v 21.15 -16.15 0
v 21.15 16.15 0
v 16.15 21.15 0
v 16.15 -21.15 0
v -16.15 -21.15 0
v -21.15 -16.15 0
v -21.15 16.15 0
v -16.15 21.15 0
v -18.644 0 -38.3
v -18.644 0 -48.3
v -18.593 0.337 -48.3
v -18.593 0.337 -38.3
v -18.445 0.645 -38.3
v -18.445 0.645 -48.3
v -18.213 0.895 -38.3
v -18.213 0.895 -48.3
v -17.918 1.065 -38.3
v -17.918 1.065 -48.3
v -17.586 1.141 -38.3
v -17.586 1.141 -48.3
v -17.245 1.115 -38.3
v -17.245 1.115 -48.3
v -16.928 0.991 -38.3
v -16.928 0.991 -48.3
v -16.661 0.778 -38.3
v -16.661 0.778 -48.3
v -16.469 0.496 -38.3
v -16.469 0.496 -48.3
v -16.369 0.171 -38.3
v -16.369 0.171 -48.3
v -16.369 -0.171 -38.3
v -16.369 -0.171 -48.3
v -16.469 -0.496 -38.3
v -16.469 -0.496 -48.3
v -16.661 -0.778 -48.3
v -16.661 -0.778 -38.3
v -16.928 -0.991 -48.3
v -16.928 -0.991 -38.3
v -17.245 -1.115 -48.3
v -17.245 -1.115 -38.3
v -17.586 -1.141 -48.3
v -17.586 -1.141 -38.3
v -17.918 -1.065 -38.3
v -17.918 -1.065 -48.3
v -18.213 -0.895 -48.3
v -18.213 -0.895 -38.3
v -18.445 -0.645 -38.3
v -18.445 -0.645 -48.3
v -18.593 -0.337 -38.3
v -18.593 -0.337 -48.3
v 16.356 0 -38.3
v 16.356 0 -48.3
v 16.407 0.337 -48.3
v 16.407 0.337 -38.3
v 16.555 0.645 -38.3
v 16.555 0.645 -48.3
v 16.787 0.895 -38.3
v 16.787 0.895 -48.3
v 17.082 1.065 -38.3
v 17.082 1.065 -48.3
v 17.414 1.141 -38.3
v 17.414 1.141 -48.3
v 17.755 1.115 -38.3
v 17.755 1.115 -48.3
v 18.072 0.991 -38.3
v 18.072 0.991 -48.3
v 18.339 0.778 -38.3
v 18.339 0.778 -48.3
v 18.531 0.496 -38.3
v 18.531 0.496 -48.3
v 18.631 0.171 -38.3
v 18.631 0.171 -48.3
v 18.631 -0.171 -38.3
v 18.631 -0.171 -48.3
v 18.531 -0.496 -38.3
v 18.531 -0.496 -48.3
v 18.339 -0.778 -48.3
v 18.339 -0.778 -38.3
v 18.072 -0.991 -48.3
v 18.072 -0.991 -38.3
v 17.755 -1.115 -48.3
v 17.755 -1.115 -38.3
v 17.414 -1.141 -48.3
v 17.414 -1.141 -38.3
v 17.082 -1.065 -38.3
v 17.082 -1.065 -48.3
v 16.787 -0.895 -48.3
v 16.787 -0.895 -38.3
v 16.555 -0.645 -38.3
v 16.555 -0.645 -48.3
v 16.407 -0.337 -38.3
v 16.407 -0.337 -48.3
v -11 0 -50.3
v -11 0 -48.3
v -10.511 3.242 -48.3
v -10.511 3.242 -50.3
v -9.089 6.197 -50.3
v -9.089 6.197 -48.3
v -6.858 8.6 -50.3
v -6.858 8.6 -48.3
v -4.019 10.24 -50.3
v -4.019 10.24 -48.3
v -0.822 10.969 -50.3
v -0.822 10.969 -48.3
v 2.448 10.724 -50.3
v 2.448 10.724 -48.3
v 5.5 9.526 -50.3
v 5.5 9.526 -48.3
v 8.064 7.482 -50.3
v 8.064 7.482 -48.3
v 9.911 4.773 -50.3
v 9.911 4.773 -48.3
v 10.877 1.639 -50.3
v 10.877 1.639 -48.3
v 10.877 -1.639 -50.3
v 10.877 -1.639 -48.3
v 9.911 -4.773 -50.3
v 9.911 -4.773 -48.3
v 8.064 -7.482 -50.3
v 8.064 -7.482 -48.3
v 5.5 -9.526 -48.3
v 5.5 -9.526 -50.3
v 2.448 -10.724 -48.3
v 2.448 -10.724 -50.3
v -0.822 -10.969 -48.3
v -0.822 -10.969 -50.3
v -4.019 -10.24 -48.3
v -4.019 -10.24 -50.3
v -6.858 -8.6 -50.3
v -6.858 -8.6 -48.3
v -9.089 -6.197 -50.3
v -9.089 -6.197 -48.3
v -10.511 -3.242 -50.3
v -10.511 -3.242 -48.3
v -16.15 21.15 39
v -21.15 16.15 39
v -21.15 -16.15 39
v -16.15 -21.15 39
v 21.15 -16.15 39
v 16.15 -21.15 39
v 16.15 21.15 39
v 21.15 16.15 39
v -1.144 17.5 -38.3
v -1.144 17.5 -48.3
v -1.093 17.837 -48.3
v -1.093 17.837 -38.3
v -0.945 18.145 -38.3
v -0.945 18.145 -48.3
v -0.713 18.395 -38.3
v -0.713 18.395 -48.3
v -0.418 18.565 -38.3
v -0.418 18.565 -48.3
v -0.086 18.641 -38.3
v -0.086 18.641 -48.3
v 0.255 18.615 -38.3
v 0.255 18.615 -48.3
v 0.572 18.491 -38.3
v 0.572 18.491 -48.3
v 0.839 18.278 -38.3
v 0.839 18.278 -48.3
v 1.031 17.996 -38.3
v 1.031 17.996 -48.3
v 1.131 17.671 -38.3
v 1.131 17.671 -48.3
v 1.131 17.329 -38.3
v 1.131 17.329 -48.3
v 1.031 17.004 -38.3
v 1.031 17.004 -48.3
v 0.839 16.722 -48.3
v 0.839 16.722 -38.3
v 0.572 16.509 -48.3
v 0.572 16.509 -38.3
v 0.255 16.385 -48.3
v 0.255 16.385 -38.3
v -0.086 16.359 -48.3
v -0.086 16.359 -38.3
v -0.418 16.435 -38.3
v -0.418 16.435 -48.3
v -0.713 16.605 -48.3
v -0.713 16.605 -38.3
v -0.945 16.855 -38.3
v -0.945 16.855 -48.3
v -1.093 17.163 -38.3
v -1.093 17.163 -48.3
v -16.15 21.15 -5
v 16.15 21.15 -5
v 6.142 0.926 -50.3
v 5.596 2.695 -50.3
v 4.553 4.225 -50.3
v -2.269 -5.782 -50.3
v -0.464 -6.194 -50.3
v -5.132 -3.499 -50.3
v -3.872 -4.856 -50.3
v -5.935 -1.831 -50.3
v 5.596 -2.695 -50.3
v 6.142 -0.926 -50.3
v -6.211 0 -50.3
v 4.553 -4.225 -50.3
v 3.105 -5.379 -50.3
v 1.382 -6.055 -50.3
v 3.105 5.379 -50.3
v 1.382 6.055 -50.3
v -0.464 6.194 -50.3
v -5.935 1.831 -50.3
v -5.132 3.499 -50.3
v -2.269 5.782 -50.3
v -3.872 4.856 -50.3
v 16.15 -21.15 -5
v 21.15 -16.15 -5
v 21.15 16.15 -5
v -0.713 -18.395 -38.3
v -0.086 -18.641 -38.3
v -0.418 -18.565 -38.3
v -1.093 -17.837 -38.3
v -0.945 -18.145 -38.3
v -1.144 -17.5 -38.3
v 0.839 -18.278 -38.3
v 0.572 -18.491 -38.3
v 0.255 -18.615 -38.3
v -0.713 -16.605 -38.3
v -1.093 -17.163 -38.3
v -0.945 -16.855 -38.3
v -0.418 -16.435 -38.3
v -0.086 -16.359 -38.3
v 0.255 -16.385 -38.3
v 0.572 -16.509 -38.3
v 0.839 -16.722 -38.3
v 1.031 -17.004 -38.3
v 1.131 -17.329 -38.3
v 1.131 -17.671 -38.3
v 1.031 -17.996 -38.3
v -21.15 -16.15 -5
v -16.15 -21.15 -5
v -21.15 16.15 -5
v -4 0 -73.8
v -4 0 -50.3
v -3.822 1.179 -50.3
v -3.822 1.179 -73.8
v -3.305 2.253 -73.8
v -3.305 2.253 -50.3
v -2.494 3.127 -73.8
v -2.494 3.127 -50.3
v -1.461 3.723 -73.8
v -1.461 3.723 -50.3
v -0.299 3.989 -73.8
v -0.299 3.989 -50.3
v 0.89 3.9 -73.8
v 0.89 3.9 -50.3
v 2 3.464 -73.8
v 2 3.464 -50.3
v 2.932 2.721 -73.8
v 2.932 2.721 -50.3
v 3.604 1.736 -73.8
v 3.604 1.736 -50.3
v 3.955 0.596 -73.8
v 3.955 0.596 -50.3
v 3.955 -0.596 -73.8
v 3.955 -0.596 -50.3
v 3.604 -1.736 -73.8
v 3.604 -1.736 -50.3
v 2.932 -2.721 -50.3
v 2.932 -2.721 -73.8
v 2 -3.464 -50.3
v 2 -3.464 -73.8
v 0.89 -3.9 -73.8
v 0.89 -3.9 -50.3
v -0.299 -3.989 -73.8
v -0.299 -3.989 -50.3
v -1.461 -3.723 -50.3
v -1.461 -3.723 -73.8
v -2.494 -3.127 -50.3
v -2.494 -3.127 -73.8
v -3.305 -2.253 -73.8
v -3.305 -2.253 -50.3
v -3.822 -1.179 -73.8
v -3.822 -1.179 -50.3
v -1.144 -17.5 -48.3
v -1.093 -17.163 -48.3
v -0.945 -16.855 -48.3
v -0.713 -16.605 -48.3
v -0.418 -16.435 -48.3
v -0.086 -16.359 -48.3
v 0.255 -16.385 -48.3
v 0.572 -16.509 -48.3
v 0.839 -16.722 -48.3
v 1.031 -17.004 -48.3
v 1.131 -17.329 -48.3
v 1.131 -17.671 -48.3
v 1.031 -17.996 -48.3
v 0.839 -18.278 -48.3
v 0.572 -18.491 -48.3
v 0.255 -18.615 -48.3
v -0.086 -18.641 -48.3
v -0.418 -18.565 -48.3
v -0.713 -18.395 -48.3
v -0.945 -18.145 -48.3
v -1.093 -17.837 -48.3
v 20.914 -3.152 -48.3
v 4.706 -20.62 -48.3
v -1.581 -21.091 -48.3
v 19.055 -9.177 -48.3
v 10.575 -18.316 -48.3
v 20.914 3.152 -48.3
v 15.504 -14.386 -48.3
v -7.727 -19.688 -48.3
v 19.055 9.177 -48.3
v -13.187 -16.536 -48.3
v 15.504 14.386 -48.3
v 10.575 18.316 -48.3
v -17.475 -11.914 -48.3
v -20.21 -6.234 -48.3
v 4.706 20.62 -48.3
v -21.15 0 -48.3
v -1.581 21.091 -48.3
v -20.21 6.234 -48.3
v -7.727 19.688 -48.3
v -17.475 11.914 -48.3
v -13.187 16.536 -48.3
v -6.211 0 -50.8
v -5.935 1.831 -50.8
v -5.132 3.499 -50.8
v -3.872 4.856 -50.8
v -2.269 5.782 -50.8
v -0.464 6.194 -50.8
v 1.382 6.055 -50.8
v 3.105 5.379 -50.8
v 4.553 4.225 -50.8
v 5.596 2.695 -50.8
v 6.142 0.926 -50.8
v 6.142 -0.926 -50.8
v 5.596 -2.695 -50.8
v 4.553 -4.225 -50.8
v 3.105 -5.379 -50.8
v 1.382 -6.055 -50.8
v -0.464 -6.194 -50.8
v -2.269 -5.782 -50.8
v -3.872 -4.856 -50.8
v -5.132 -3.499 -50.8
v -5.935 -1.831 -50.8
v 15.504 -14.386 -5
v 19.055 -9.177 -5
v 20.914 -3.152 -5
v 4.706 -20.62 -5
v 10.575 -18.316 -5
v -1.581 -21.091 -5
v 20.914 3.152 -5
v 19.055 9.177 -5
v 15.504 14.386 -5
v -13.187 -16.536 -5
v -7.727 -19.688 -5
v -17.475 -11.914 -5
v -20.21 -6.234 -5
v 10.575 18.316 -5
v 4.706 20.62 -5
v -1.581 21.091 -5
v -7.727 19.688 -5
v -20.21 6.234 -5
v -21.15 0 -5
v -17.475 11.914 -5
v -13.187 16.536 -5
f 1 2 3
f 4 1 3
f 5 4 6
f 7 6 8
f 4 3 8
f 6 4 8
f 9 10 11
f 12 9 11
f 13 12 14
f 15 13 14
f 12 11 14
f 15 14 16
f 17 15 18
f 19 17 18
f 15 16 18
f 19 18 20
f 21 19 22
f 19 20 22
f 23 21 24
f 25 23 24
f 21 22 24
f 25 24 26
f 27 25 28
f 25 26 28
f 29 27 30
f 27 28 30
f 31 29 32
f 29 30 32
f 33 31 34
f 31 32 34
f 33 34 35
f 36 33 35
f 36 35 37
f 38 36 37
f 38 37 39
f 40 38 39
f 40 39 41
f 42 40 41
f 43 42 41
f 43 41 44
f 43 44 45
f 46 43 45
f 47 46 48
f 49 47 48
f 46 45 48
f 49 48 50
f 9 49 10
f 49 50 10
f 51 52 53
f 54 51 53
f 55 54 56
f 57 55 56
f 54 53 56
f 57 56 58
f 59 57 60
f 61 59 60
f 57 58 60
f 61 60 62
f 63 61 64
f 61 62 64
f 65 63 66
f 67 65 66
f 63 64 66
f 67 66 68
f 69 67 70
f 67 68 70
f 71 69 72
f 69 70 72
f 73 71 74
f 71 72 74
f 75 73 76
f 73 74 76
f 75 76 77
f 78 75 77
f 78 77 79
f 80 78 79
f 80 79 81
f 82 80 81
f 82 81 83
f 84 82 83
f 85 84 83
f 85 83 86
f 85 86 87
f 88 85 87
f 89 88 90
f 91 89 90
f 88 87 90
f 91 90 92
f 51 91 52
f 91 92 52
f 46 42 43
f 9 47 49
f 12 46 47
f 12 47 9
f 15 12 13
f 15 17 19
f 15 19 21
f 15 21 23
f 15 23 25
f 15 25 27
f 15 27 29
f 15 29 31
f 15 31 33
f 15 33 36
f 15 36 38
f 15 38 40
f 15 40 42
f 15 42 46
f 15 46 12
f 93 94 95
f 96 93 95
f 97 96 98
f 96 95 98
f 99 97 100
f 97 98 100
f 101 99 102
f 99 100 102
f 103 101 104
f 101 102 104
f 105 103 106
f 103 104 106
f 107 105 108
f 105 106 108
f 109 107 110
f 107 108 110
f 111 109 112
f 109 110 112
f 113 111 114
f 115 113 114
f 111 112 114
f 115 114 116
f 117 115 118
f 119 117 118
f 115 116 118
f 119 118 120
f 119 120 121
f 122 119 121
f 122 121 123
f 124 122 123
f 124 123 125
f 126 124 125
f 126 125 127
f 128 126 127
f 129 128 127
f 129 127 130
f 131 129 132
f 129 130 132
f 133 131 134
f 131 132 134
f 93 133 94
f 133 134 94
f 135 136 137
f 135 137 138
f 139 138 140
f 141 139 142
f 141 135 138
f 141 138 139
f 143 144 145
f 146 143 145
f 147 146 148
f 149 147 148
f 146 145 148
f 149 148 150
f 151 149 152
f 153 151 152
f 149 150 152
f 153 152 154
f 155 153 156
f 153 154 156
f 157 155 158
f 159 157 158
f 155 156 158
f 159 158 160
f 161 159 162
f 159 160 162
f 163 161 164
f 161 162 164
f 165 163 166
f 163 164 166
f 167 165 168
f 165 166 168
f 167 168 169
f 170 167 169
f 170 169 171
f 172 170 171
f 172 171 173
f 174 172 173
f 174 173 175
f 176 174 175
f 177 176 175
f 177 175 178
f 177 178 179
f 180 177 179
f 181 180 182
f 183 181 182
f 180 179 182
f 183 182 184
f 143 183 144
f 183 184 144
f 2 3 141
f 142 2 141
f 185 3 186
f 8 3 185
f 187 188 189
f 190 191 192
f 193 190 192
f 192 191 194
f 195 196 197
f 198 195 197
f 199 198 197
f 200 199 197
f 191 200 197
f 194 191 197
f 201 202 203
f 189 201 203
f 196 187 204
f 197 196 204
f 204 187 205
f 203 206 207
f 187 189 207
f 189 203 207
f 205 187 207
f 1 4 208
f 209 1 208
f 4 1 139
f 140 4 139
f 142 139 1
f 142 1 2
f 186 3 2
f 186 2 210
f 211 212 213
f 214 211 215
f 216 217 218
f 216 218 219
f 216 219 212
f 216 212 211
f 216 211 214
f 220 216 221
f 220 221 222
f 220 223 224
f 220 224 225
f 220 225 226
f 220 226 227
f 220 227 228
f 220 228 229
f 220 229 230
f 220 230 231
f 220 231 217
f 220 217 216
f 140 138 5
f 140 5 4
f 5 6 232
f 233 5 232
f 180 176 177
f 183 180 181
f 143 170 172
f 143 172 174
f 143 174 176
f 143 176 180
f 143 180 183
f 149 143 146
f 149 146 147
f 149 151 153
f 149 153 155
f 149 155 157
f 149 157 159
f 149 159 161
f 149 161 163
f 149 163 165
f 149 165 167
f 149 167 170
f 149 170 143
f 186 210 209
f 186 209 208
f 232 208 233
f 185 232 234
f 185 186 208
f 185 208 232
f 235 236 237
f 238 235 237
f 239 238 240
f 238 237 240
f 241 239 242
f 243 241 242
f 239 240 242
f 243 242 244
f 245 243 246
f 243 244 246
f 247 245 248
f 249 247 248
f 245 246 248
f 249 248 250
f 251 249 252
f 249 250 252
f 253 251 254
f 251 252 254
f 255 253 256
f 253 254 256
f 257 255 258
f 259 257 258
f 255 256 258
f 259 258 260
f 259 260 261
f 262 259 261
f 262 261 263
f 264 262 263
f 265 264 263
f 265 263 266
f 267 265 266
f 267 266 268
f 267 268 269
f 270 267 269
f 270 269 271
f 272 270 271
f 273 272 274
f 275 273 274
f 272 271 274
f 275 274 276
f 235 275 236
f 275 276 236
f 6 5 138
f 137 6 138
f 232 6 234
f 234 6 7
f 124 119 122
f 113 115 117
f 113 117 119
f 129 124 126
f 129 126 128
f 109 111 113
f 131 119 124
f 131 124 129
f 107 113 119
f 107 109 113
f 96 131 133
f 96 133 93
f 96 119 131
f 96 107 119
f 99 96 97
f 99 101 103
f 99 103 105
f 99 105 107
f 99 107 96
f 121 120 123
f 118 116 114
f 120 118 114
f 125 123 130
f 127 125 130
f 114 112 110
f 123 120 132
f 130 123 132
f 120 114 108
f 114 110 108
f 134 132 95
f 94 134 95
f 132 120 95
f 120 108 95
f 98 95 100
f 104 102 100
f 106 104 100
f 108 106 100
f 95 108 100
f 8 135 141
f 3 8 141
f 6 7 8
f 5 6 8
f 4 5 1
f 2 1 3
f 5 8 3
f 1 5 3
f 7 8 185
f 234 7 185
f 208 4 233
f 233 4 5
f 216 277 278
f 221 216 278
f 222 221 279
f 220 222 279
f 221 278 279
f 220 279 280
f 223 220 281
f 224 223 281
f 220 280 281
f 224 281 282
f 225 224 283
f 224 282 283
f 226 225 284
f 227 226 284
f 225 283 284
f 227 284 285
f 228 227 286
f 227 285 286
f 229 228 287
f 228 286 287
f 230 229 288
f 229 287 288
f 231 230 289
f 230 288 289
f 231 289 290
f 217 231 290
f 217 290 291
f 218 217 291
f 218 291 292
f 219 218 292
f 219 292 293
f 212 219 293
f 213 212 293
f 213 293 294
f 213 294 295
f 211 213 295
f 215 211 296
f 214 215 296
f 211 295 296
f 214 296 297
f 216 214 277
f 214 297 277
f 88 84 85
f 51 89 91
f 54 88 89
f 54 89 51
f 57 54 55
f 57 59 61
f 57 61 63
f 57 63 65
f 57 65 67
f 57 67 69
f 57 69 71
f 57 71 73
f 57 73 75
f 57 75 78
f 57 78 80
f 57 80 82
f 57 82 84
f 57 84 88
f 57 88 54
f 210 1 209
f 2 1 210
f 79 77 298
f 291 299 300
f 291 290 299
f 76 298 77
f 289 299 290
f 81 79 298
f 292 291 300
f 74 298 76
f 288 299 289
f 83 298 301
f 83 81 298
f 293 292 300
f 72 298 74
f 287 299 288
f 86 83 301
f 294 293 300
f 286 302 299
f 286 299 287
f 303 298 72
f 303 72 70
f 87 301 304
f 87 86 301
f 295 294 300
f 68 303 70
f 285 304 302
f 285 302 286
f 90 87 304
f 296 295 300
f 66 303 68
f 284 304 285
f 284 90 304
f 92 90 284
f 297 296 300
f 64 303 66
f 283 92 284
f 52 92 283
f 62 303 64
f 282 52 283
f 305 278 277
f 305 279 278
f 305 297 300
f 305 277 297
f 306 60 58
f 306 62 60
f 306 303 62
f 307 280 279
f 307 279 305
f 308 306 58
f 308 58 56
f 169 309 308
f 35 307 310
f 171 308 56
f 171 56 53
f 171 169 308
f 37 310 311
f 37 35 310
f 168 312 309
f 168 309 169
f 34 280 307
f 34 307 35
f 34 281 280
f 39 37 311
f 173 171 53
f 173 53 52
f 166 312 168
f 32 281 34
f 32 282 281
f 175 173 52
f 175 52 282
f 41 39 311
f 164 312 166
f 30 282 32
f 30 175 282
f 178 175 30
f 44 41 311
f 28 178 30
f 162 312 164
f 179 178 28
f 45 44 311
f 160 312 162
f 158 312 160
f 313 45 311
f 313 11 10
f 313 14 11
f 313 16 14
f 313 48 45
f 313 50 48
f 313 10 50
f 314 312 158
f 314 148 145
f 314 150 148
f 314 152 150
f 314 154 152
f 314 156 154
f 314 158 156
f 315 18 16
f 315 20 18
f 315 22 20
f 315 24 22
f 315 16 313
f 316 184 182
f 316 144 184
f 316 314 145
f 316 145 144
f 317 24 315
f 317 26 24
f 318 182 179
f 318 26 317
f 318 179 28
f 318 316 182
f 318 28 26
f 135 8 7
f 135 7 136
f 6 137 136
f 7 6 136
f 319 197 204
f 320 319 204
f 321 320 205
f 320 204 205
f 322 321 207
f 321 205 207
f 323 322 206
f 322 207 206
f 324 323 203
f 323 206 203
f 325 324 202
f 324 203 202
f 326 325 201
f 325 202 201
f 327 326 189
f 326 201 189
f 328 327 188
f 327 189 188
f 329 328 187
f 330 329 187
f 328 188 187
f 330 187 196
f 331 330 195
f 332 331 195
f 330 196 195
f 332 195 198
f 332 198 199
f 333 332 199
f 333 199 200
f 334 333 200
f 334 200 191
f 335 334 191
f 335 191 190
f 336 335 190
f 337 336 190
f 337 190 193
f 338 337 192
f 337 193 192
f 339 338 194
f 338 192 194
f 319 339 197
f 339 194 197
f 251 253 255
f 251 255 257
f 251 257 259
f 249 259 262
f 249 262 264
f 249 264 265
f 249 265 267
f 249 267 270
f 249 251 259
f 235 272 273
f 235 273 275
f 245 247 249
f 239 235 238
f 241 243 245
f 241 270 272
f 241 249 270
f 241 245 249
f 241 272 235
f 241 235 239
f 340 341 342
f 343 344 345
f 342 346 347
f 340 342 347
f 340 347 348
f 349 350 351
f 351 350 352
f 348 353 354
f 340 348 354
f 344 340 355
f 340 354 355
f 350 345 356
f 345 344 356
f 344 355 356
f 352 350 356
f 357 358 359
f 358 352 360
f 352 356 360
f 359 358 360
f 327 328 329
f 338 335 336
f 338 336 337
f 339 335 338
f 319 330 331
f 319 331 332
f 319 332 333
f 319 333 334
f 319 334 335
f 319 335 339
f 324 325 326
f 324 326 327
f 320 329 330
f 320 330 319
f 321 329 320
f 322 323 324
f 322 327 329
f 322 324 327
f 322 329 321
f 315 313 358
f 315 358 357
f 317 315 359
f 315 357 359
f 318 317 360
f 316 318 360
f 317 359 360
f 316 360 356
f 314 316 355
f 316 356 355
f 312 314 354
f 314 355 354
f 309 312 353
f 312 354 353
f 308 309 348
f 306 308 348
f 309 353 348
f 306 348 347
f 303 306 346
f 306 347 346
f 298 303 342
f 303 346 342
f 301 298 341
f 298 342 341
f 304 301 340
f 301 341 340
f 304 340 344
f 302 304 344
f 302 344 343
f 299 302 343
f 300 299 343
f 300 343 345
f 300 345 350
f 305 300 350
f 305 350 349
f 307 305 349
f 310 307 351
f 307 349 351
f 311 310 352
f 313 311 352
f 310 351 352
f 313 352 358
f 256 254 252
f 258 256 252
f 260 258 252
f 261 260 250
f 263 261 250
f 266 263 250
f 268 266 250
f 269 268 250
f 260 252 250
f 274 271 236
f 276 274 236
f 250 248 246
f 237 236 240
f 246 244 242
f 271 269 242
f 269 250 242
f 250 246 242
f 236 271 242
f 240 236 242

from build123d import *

# Parameters (mm, degrees)
SKETCH1_W           = 42.3
SKETCH1_H           = 42.3
BOSS_EXTRUDE1_DEPTH = 39
CHAMFER1_SIZE       = 5
SKETCH2_W           = 42.3
SKETCH2_H           = 42.3
BOSS_EXTRUDE2_DEPTH = 5
CHAMFER2_SIZE       = 5
SKETCH3_R           = 21.15
BOSS_EXTRUDE3_DEPTH = 43.3
SKETCH4_R           = 11
BOSS_EXTRUDE4_DEPTH = 2
SKETCH5_R           = 4
BOSS_EXTRUDE5_DEPTH = 23.5
SKETCH6_R           = 6.210975092
BOSS_EXTRUDE6_DEPTH = 0.5
SKETCH7_R           = 1.144150663
CUT_EXTRUDE1_DEPTH  = 10


with BuildPart() as part:
    # Sketch1 → Boss-Extrude1 (new body)
    with BuildSketch(Plane.XY):
        Rectangle(SKETCH1_W, SKETCH1_H)
    extrude(amount=BOSS_EXTRUDE1_DEPTH)

    # Chamfer1
    chamfer1_edges = [part.edges().sort_by_distance(p)[0] for p in [
        (21.15, -21.15, 19.5),
        (-21.15, -21.15, 19.5),
        (-21.15, 21.15, 19.5),
        (21.15, 21.15, 19.5),
    ]]
    chamfer(chamfer1_edges, length=CHAMFER1_SIZE)


with BuildPart() as body_2:
    # Sketch2 → Boss-Extrude2 (new body)
    with BuildSketch(Plane(origin=(0, 0, 0), x_dir=(-1, 0, 0), z_dir=(0, 0, -1))):
        Rectangle(SKETCH2_W, SKETCH2_H)
    extrude(amount=BOSS_EXTRUDE2_DEPTH)

    # Chamfer2
    chamfer2_edges = [body_2.edges().sort_by_distance(p)[0] for p in [
        (-21.15, -21.15, -2.5),
        (21.15, -21.15, -2.5),
        (21.15, 21.15, -2.5),
        (-21.15, 21.15, -2.5),
    ]]
    chamfer(chamfer2_edges, length=CHAMFER2_SIZE)


with BuildPart() as body_3:
    # Sketch3 → Boss-Extrude3 (new body)
    with BuildSketch(Plane(origin=(0, 0, -5), x_dir=(-1, 0, 0), z_dir=(0, 0, -1))):
        Circle(SKETCH3_R)
    extrude(amount=BOSS_EXTRUDE3_DEPTH)

    # Sketch7 → Cut-Extrude1 (cut)
    with BuildSketch(Plane(origin=(0, 0, -48.3), x_dir=(-1, 0, 0), z_dir=(0, 0, -1))):
        with Locations((0, 17.5)):
            Circle(SKETCH7_R)
        with Locations((17.5, 0)):
            Circle(SKETCH7_R)
        with Locations((0, -17.5)):
            Circle(SKETCH7_R)
        with Locations((-17.5, 0)):
            Circle(SKETCH7_R)
    extrude(amount=-CUT_EXTRUDE1_DEPTH, mode=Mode.SUBTRACT)


with BuildPart() as body_4:
    # Sketch4 → Boss-Extrude4 (new body)
    with BuildSketch(Plane(origin=(0, 0, -48.3), x_dir=(-1, 0, 0), z_dir=(0, 0, -1))):
        Circle(SKETCH4_R)
    extrude(amount=BOSS_EXTRUDE4_DEPTH)


with BuildPart() as body_5:
    # Sketch5 → Boss-Extrude5 (new body)
    with BuildSketch(Plane(origin=(0, 0, -50.3), x_dir=(-1, 0, 0), z_dir=(0, 0, -1))):
        Circle(SKETCH5_R)
    extrude(amount=BOSS_EXTRUDE5_DEPTH)


with BuildPart() as body_6:
    # Sketch6 → Boss-Extrude6 (new body)
    with BuildSketch(Plane(origin=(0, 0, -50.3), x_dir=(-1, 0, 0), z_dir=(0, 0, -1))):
        Circle(SKETCH6_R)
    extrude(amount=BOSS_EXTRUDE6_DEPTH)


solid = Compound([part.part, body_2.part, body_3.part, body_4.part, body_5.part, body_6.part])
